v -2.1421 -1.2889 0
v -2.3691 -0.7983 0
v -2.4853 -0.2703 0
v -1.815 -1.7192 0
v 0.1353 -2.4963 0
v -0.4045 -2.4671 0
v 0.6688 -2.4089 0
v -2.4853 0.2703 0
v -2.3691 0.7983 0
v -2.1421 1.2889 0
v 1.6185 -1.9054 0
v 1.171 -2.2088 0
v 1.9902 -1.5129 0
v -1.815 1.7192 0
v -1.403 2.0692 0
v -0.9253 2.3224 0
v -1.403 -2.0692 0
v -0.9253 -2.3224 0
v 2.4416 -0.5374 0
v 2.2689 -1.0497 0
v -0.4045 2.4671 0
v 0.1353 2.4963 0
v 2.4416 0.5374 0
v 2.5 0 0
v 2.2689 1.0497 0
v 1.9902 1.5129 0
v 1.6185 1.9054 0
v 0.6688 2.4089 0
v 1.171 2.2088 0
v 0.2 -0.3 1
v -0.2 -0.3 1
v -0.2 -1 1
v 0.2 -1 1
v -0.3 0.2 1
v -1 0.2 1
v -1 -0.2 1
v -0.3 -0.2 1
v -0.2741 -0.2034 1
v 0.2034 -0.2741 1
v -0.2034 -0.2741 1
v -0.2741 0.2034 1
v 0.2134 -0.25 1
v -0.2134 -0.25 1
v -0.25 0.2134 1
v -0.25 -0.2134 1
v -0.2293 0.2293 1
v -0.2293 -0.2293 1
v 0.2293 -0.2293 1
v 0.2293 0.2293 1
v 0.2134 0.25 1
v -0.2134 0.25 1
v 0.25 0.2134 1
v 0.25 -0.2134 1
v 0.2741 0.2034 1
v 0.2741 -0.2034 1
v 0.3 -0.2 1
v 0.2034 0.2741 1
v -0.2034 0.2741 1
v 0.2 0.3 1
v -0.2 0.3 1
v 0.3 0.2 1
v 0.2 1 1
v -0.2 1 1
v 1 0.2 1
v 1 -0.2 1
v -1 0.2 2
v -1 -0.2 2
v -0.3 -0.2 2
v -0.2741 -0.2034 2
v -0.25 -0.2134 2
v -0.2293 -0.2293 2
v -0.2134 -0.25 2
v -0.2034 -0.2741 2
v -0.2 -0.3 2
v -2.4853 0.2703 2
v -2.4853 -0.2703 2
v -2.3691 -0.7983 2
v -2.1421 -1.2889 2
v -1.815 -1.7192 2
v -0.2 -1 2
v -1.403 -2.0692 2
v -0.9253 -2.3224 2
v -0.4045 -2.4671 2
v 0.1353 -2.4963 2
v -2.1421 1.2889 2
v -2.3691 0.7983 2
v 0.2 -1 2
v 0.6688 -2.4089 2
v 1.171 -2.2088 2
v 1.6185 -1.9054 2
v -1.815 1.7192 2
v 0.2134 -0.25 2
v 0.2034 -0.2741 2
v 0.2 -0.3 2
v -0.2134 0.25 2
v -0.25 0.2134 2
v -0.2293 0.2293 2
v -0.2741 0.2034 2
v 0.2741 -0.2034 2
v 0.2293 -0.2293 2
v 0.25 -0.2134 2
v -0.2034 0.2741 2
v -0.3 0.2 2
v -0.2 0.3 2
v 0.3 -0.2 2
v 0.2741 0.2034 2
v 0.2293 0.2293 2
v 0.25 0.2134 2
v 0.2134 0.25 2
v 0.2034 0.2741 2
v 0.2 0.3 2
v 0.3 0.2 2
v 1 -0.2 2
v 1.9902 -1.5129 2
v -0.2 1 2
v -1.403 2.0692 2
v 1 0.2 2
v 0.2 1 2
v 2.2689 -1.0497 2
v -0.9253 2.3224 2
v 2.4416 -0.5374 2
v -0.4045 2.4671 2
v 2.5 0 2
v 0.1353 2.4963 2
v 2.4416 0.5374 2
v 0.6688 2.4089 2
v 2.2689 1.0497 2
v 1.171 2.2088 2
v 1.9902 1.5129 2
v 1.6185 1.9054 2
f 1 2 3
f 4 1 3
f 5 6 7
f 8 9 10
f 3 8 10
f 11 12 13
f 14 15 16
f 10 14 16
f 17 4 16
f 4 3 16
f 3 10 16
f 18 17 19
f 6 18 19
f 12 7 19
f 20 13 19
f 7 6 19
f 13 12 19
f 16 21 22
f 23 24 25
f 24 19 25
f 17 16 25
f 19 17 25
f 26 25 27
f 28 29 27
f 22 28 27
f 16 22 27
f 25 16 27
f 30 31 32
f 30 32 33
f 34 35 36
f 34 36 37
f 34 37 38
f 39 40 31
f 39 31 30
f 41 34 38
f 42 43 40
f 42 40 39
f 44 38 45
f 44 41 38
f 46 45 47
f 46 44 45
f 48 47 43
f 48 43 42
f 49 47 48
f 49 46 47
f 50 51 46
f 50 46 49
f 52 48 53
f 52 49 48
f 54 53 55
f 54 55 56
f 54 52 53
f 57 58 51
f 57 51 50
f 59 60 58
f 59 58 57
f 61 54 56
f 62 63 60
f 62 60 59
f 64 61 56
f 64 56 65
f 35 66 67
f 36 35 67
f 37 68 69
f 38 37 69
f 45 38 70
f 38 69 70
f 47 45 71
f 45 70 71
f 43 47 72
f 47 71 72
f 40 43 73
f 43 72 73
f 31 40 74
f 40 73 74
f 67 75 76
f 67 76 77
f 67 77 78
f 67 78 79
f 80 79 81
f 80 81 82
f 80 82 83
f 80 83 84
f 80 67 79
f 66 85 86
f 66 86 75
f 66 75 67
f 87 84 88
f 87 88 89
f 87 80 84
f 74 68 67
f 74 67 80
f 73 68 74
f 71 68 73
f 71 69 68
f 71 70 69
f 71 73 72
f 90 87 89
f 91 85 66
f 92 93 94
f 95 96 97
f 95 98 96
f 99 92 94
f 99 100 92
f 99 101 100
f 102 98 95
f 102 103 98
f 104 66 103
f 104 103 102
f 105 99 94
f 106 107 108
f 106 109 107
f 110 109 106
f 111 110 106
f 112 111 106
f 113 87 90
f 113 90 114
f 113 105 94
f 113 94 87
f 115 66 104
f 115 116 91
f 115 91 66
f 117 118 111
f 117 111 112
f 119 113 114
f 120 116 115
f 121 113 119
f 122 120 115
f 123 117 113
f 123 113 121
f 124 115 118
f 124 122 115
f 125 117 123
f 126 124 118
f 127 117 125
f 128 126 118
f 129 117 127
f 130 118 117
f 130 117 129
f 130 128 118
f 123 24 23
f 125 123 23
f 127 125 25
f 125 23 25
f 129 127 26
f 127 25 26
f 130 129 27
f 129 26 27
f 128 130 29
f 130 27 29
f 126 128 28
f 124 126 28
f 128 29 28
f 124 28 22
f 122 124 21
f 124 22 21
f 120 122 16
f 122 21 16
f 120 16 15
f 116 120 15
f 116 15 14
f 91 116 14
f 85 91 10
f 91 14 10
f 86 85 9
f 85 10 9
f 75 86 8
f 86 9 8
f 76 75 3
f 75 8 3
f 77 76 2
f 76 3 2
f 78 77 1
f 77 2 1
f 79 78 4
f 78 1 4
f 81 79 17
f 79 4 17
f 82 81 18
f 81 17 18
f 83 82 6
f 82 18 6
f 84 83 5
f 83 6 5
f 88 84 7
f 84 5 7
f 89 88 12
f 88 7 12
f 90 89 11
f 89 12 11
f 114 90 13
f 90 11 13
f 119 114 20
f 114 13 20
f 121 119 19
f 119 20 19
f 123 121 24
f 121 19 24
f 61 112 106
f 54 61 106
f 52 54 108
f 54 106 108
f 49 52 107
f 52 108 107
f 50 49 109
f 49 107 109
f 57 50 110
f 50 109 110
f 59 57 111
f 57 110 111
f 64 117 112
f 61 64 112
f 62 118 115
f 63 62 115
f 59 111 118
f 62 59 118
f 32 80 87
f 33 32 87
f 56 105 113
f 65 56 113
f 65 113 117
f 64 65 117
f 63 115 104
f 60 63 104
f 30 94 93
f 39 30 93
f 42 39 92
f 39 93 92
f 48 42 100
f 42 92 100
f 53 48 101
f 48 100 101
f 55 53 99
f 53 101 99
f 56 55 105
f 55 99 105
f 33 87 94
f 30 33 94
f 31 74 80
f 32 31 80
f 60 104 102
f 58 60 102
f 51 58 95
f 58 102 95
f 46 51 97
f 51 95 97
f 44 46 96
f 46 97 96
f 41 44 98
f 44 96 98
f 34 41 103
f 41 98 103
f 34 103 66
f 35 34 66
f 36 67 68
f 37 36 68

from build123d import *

# Parameters (mm, degrees)
F0_R     = 2.5
F1_DEPTH = 2
F3_DEPTH = 1


with BuildPart() as f1:
    # F0 (on Top) → F1 (new body)
    with BuildSketch(Plane.XY):
        Circle(F0_R)
    extrude(amount=F1_DEPTH)

    # F2 (on face) → F3 (cut)
    with BuildSketch(Plane.XY.offset(2)):
        with BuildLine():
            Line((-0.2, -0.3), (-0.2, -1))
            Line((-0.2, -1), (0.2, -1))
            Line((0.2, -1), (0.2, -0.3))
            ThreePointArc((0.2, -0.3), (0.229289, -0.229289), (0.3, -0.2))
            Line((0.3, -0.2), (1, -0.2))
            Line((1, -0.2), (1, 0.2))
            Line((1, 0.2), (0.3, 0.2))
            ThreePointArc((0.3, 0.2), (0.229289, 0.229289), (0.2, 0.3))
            Line((0.2, 0.3), (0.2, 1))
            Line((0.2, 1), (-0.2, 1))
            Line((-0.2, 1), (-0.2, 0.3))
            ThreePointArc((-0.2, 0.3), (-0.229289, 0.229289), (-0.3, 0.2))
            Line((-0.3, 0.2), (-1, 0.2))
            Line((-1, 0.2), (-1, -0.2))
            Line((-1, -0.2), (-0.3, -0.2))
            ThreePointArc((-0.3, -0.2), (-0.229289, -0.229289), (-0.2, -0.3))
        make_face()
    extrude(amount=-F3_DEPTH, mode=Mode.SUBTRACT)


solid = f1.part
